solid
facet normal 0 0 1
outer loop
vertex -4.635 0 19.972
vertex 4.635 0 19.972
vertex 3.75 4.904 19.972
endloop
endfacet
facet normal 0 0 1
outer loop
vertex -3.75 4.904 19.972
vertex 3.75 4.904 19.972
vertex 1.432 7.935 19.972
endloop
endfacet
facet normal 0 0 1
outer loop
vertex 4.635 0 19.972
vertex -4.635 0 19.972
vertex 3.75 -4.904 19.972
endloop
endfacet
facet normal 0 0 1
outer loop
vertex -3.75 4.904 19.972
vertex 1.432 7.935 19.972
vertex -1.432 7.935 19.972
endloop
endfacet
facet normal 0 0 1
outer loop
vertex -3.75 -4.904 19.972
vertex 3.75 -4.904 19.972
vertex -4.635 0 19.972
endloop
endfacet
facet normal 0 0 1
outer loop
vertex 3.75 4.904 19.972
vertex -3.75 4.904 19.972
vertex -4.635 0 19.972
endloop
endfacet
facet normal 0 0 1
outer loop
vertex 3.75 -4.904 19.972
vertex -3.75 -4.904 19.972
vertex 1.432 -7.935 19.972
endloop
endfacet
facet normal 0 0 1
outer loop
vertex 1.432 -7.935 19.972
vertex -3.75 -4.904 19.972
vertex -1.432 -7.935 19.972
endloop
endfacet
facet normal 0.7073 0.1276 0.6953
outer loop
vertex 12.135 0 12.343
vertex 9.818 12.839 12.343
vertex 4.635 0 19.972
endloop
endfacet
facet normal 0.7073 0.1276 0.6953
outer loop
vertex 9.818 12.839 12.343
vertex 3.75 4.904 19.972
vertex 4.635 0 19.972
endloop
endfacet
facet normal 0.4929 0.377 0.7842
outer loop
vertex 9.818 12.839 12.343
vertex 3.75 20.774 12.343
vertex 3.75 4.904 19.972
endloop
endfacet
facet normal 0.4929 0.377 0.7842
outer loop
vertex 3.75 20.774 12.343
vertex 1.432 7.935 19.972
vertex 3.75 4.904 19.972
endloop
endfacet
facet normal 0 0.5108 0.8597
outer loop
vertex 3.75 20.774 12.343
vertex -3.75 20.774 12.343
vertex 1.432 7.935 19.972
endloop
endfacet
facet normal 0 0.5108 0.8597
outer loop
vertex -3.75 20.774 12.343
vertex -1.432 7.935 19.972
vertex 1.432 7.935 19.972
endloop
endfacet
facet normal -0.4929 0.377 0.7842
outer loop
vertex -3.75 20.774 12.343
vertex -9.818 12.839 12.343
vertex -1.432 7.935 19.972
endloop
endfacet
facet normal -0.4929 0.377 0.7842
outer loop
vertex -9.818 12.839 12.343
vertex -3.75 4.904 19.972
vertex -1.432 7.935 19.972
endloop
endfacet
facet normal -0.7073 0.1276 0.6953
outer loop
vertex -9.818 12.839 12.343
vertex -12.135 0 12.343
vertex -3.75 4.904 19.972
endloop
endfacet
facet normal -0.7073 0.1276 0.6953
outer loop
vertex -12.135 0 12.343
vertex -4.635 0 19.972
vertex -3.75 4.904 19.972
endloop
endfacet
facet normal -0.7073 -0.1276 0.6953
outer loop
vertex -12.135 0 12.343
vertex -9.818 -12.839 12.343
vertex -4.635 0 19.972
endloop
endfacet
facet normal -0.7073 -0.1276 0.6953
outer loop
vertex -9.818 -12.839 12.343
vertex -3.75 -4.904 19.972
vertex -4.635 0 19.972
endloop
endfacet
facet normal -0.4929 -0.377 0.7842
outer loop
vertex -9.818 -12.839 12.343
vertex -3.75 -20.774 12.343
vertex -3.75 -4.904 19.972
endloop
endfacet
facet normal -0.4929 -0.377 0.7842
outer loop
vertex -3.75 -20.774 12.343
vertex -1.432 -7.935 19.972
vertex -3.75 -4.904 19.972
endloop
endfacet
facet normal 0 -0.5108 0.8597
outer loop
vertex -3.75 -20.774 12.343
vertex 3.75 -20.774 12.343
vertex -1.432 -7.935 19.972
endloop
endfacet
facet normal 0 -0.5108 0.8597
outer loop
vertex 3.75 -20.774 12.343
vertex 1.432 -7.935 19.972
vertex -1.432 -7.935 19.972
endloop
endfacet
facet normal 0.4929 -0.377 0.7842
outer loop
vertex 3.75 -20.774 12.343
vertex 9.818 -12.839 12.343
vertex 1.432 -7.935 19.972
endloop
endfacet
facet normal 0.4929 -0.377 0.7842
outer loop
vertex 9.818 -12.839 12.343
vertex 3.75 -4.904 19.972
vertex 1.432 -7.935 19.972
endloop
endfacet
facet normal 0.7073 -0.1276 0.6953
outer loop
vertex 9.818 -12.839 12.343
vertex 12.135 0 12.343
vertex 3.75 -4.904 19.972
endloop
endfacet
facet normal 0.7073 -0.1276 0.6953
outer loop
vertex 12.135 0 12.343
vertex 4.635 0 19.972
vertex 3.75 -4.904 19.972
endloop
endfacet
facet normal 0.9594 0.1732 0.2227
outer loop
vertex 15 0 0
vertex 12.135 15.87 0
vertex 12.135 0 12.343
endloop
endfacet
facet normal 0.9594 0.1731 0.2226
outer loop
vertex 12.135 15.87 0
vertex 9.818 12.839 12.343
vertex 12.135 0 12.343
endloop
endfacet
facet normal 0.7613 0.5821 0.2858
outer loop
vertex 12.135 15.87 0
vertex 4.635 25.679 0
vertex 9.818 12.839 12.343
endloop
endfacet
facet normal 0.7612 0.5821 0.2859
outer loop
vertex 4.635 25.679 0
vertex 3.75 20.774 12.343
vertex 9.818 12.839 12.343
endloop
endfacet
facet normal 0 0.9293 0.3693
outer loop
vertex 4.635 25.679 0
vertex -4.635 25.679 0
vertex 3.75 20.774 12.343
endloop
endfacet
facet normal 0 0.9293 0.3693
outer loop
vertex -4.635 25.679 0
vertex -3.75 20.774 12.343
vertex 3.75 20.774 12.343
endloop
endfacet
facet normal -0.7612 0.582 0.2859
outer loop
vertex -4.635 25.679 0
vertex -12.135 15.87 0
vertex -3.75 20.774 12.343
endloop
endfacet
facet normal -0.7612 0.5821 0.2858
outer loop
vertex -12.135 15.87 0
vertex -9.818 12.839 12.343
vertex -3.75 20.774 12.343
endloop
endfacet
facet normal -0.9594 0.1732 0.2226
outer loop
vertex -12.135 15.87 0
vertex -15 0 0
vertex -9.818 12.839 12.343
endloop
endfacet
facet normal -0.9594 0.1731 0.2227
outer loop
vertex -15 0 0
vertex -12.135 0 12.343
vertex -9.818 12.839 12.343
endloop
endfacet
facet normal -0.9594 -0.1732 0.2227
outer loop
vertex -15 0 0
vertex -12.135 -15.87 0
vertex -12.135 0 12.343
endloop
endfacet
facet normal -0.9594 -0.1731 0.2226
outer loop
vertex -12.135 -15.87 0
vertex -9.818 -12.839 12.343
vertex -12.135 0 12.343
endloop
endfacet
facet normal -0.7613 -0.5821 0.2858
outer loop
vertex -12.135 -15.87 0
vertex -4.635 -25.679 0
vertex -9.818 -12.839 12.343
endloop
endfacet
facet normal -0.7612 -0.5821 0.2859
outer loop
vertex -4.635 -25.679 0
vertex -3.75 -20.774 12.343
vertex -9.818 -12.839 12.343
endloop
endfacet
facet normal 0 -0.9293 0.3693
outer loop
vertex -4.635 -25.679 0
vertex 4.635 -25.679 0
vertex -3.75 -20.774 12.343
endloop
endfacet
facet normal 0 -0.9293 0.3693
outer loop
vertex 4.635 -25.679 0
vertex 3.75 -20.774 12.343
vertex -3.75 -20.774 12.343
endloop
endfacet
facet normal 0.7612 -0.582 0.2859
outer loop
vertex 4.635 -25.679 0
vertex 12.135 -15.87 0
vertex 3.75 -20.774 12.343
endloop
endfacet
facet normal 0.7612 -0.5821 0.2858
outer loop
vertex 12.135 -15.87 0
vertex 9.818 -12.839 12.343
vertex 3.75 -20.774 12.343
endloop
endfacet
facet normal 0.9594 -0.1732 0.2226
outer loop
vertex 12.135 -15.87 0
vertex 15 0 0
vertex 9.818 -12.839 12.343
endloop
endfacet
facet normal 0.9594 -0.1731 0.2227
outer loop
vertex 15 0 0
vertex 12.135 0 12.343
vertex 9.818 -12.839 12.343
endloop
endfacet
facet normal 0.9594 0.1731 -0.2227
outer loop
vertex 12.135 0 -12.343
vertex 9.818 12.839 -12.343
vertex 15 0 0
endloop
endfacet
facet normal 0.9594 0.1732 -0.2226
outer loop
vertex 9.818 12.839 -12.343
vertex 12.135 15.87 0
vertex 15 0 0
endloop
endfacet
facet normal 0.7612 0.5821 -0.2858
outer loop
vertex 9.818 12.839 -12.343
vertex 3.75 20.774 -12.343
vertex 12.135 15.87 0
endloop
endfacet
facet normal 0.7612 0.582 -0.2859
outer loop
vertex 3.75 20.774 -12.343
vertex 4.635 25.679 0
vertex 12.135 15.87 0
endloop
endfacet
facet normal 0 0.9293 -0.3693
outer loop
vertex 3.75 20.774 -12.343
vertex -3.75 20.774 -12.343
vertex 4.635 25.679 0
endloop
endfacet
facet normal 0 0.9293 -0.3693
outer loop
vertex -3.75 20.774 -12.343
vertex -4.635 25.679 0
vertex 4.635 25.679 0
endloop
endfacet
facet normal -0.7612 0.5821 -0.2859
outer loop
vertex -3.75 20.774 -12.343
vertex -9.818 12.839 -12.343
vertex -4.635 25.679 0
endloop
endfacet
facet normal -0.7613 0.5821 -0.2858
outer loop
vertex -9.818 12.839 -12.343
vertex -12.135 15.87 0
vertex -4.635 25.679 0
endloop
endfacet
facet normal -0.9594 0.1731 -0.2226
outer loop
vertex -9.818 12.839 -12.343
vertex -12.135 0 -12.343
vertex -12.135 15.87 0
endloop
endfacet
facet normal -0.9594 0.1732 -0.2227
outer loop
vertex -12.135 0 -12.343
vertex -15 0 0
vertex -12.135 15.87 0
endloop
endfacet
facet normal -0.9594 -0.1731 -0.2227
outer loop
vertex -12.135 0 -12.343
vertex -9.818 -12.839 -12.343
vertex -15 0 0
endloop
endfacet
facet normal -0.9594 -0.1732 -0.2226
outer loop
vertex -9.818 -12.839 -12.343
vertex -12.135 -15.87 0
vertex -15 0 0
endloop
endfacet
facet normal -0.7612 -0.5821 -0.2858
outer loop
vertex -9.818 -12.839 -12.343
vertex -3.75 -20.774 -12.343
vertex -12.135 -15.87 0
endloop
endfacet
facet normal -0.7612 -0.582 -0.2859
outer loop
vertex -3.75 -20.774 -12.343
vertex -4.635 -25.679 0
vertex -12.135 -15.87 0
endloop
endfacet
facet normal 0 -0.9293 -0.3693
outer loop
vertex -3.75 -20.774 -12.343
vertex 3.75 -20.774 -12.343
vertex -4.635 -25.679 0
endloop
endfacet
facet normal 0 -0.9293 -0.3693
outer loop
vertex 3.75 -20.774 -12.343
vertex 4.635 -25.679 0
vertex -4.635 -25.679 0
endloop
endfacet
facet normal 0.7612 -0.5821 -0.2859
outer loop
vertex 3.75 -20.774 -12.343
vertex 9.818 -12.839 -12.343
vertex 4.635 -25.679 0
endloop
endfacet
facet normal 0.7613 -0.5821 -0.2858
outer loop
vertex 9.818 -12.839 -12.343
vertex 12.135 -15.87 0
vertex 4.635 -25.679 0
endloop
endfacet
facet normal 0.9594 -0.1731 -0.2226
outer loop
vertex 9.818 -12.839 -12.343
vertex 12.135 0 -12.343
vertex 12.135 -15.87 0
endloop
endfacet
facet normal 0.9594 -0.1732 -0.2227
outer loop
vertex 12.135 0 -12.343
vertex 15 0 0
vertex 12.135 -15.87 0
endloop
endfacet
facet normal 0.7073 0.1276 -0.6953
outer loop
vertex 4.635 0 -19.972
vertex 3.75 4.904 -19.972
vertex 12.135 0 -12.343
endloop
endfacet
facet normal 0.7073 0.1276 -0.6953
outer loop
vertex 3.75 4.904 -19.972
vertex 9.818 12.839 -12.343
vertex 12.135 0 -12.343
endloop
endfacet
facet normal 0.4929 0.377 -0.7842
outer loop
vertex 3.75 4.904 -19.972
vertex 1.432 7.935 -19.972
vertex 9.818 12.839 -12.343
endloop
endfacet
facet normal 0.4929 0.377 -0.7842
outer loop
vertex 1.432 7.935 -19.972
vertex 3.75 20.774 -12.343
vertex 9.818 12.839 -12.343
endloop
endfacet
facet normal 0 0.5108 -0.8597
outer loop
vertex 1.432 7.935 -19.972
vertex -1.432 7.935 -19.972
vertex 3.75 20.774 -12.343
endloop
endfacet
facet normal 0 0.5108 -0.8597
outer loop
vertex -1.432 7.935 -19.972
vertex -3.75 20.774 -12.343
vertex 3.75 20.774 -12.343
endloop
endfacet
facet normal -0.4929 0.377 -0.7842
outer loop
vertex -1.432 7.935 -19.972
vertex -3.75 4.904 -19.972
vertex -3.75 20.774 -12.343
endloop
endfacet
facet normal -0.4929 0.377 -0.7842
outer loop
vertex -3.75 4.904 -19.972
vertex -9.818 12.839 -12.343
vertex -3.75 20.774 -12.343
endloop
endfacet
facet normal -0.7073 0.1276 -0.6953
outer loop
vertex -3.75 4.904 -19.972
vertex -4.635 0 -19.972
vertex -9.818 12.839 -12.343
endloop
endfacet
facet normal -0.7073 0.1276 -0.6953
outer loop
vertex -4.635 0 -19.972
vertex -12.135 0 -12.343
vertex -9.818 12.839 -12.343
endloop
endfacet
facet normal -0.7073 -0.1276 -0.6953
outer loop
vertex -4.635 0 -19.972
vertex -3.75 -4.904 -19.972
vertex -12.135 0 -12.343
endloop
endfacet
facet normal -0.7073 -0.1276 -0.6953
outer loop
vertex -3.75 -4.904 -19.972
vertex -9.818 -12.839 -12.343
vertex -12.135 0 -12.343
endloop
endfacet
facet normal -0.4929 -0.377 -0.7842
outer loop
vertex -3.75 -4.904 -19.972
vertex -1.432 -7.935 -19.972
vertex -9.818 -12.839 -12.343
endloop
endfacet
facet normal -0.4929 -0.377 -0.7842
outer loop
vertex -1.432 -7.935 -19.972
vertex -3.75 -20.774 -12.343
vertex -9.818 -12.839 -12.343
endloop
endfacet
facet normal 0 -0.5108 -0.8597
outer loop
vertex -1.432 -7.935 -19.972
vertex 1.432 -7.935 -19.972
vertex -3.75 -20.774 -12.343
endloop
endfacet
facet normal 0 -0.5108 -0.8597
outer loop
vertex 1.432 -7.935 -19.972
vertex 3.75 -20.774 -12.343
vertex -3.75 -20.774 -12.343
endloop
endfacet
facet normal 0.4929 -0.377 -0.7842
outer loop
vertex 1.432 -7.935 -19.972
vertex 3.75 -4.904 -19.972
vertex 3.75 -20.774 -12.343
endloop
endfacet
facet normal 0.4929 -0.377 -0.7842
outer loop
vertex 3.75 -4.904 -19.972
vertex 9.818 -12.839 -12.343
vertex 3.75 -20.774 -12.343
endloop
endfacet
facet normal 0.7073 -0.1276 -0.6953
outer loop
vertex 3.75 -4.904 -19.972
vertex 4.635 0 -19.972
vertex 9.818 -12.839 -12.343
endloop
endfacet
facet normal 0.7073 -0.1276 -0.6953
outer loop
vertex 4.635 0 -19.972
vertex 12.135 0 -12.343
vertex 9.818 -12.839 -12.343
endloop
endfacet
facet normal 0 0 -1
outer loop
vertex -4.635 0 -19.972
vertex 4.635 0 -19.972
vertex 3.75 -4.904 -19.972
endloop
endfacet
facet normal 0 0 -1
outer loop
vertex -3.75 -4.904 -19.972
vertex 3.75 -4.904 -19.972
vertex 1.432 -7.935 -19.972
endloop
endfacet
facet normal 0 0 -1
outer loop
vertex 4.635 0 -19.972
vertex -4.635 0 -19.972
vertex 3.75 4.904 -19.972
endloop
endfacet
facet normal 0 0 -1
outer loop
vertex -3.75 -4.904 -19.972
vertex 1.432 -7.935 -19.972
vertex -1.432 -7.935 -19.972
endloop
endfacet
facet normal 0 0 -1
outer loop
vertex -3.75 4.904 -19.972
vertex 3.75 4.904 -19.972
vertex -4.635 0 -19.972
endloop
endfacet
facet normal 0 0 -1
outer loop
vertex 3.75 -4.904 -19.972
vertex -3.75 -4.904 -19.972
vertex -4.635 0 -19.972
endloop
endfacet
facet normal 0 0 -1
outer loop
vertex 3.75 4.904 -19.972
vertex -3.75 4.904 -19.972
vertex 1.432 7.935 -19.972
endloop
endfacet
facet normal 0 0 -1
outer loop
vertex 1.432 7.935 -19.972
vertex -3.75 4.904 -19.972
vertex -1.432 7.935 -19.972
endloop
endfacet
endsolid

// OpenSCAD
// Generated by SolidPython 1.0.1 on 2020-07-29 00:46:46


scale(v = [5, 9, 7]) {
	sphere(r = 3);
}
/***********************************************
*********      SolidPython code:      **********
************************************************
 
# import packages: SolidPython
from solid import *
from solid.utils import *
from itertools import chain, combinations, permutations


class Resize:

    def __init__(self, scad_file):
        self.scad_file = scad_file
        #self.scad_file = import_scad(scad_file)
        # cone/cylinder param:
        self.r1 = 0
        self.r2 = 0
        self.h = 0
        # rectangular prism param:
        self.w = 0
        self.l = 0
        # ellipse param:
        self.r = 0

    # import OpenScad code (file name corresponds to shape)


    # classify shape + parameters
    def assign(self, param1, param2, param3):
        if self.scad_file == 'cone.scad':
            self.r1 = param1
            self.r2 = param2
            self.h = param3
        elif self.scad_file == 'cylinder.scad':
            self.r1 = param1
            self.r2 = param2
            self.h = param3
        elif self.scad_file == 'rectangularPrism.scad':
            self.h = param1
            self.l = param2
            self.w = param3
        else:
            self.r = param1
            self.h = param2

    # resize parameters
    def iterate(self):
        x = range(3, 20, 2)
        i = 1
        if self.scad_file == 'cone.scad':
            tempList = list(permutations(x, 2))
            for temp in tempList:
                param1 = temp[0]
                param2 = temp[1]
                filepath = 'produced_scad_files/' + 'cone' + str(param1) + '_' + str(param2) + '_' + '.scad'
                scad_render_to_file(cylinder(h=param1, r1=param2, r2=0), filepath)

        elif self.scad_file == 'cylinder.scad':
            tempList = list(permutations(x, 3))
            for temp in tempList:
                param1 = temp[0]
                param2 = temp[1]
                filepath = 'produced_scad_files/' + 'cylinder' + str(param1) + '_' + str(param2) + '_' + '.scad'
                scad_render_to_file(cylinder(h=param1, r1=param2, r2=param2), filepath)

        elif self.scad_file == 'rectangularPrism.scad':
            tempList = list(permutations(x, 3))
            for temp in tempList:
                param1 = temp[0]
                param2 = temp[1]
                param3 = temp[2]
                filepath = 'produced_scad_files/' + 'rectangularPrism' + str(param1) + '_' + str(param2) + '_' + str(
                    param3) + '.scad'
                scad_render_to_file(cube(size=(param1, param2, param3)), filepath)

        elif self.scad_file == 'ellipse.scad':
            tempList = list(permutations(x, 4))
            for temp in tempList:
                param1 = temp[0]
                param2 = temp[1]
                param3 = temp[2]
                param4 = temp[3]
                filepath = 'produced_scad_files/' + 'ellipse' + str(param1) + '_' + str(param2) + '_' + str(param3) + '_' + str(param4) + '.scad'
                scad_render_to_file(scale([param1, param2, param3])(sphere(r=param4)), filepath)

    def render_to_scadfile(self):
        scad_render_to_file(scad, 'example.scad') 
 
************************************************/
